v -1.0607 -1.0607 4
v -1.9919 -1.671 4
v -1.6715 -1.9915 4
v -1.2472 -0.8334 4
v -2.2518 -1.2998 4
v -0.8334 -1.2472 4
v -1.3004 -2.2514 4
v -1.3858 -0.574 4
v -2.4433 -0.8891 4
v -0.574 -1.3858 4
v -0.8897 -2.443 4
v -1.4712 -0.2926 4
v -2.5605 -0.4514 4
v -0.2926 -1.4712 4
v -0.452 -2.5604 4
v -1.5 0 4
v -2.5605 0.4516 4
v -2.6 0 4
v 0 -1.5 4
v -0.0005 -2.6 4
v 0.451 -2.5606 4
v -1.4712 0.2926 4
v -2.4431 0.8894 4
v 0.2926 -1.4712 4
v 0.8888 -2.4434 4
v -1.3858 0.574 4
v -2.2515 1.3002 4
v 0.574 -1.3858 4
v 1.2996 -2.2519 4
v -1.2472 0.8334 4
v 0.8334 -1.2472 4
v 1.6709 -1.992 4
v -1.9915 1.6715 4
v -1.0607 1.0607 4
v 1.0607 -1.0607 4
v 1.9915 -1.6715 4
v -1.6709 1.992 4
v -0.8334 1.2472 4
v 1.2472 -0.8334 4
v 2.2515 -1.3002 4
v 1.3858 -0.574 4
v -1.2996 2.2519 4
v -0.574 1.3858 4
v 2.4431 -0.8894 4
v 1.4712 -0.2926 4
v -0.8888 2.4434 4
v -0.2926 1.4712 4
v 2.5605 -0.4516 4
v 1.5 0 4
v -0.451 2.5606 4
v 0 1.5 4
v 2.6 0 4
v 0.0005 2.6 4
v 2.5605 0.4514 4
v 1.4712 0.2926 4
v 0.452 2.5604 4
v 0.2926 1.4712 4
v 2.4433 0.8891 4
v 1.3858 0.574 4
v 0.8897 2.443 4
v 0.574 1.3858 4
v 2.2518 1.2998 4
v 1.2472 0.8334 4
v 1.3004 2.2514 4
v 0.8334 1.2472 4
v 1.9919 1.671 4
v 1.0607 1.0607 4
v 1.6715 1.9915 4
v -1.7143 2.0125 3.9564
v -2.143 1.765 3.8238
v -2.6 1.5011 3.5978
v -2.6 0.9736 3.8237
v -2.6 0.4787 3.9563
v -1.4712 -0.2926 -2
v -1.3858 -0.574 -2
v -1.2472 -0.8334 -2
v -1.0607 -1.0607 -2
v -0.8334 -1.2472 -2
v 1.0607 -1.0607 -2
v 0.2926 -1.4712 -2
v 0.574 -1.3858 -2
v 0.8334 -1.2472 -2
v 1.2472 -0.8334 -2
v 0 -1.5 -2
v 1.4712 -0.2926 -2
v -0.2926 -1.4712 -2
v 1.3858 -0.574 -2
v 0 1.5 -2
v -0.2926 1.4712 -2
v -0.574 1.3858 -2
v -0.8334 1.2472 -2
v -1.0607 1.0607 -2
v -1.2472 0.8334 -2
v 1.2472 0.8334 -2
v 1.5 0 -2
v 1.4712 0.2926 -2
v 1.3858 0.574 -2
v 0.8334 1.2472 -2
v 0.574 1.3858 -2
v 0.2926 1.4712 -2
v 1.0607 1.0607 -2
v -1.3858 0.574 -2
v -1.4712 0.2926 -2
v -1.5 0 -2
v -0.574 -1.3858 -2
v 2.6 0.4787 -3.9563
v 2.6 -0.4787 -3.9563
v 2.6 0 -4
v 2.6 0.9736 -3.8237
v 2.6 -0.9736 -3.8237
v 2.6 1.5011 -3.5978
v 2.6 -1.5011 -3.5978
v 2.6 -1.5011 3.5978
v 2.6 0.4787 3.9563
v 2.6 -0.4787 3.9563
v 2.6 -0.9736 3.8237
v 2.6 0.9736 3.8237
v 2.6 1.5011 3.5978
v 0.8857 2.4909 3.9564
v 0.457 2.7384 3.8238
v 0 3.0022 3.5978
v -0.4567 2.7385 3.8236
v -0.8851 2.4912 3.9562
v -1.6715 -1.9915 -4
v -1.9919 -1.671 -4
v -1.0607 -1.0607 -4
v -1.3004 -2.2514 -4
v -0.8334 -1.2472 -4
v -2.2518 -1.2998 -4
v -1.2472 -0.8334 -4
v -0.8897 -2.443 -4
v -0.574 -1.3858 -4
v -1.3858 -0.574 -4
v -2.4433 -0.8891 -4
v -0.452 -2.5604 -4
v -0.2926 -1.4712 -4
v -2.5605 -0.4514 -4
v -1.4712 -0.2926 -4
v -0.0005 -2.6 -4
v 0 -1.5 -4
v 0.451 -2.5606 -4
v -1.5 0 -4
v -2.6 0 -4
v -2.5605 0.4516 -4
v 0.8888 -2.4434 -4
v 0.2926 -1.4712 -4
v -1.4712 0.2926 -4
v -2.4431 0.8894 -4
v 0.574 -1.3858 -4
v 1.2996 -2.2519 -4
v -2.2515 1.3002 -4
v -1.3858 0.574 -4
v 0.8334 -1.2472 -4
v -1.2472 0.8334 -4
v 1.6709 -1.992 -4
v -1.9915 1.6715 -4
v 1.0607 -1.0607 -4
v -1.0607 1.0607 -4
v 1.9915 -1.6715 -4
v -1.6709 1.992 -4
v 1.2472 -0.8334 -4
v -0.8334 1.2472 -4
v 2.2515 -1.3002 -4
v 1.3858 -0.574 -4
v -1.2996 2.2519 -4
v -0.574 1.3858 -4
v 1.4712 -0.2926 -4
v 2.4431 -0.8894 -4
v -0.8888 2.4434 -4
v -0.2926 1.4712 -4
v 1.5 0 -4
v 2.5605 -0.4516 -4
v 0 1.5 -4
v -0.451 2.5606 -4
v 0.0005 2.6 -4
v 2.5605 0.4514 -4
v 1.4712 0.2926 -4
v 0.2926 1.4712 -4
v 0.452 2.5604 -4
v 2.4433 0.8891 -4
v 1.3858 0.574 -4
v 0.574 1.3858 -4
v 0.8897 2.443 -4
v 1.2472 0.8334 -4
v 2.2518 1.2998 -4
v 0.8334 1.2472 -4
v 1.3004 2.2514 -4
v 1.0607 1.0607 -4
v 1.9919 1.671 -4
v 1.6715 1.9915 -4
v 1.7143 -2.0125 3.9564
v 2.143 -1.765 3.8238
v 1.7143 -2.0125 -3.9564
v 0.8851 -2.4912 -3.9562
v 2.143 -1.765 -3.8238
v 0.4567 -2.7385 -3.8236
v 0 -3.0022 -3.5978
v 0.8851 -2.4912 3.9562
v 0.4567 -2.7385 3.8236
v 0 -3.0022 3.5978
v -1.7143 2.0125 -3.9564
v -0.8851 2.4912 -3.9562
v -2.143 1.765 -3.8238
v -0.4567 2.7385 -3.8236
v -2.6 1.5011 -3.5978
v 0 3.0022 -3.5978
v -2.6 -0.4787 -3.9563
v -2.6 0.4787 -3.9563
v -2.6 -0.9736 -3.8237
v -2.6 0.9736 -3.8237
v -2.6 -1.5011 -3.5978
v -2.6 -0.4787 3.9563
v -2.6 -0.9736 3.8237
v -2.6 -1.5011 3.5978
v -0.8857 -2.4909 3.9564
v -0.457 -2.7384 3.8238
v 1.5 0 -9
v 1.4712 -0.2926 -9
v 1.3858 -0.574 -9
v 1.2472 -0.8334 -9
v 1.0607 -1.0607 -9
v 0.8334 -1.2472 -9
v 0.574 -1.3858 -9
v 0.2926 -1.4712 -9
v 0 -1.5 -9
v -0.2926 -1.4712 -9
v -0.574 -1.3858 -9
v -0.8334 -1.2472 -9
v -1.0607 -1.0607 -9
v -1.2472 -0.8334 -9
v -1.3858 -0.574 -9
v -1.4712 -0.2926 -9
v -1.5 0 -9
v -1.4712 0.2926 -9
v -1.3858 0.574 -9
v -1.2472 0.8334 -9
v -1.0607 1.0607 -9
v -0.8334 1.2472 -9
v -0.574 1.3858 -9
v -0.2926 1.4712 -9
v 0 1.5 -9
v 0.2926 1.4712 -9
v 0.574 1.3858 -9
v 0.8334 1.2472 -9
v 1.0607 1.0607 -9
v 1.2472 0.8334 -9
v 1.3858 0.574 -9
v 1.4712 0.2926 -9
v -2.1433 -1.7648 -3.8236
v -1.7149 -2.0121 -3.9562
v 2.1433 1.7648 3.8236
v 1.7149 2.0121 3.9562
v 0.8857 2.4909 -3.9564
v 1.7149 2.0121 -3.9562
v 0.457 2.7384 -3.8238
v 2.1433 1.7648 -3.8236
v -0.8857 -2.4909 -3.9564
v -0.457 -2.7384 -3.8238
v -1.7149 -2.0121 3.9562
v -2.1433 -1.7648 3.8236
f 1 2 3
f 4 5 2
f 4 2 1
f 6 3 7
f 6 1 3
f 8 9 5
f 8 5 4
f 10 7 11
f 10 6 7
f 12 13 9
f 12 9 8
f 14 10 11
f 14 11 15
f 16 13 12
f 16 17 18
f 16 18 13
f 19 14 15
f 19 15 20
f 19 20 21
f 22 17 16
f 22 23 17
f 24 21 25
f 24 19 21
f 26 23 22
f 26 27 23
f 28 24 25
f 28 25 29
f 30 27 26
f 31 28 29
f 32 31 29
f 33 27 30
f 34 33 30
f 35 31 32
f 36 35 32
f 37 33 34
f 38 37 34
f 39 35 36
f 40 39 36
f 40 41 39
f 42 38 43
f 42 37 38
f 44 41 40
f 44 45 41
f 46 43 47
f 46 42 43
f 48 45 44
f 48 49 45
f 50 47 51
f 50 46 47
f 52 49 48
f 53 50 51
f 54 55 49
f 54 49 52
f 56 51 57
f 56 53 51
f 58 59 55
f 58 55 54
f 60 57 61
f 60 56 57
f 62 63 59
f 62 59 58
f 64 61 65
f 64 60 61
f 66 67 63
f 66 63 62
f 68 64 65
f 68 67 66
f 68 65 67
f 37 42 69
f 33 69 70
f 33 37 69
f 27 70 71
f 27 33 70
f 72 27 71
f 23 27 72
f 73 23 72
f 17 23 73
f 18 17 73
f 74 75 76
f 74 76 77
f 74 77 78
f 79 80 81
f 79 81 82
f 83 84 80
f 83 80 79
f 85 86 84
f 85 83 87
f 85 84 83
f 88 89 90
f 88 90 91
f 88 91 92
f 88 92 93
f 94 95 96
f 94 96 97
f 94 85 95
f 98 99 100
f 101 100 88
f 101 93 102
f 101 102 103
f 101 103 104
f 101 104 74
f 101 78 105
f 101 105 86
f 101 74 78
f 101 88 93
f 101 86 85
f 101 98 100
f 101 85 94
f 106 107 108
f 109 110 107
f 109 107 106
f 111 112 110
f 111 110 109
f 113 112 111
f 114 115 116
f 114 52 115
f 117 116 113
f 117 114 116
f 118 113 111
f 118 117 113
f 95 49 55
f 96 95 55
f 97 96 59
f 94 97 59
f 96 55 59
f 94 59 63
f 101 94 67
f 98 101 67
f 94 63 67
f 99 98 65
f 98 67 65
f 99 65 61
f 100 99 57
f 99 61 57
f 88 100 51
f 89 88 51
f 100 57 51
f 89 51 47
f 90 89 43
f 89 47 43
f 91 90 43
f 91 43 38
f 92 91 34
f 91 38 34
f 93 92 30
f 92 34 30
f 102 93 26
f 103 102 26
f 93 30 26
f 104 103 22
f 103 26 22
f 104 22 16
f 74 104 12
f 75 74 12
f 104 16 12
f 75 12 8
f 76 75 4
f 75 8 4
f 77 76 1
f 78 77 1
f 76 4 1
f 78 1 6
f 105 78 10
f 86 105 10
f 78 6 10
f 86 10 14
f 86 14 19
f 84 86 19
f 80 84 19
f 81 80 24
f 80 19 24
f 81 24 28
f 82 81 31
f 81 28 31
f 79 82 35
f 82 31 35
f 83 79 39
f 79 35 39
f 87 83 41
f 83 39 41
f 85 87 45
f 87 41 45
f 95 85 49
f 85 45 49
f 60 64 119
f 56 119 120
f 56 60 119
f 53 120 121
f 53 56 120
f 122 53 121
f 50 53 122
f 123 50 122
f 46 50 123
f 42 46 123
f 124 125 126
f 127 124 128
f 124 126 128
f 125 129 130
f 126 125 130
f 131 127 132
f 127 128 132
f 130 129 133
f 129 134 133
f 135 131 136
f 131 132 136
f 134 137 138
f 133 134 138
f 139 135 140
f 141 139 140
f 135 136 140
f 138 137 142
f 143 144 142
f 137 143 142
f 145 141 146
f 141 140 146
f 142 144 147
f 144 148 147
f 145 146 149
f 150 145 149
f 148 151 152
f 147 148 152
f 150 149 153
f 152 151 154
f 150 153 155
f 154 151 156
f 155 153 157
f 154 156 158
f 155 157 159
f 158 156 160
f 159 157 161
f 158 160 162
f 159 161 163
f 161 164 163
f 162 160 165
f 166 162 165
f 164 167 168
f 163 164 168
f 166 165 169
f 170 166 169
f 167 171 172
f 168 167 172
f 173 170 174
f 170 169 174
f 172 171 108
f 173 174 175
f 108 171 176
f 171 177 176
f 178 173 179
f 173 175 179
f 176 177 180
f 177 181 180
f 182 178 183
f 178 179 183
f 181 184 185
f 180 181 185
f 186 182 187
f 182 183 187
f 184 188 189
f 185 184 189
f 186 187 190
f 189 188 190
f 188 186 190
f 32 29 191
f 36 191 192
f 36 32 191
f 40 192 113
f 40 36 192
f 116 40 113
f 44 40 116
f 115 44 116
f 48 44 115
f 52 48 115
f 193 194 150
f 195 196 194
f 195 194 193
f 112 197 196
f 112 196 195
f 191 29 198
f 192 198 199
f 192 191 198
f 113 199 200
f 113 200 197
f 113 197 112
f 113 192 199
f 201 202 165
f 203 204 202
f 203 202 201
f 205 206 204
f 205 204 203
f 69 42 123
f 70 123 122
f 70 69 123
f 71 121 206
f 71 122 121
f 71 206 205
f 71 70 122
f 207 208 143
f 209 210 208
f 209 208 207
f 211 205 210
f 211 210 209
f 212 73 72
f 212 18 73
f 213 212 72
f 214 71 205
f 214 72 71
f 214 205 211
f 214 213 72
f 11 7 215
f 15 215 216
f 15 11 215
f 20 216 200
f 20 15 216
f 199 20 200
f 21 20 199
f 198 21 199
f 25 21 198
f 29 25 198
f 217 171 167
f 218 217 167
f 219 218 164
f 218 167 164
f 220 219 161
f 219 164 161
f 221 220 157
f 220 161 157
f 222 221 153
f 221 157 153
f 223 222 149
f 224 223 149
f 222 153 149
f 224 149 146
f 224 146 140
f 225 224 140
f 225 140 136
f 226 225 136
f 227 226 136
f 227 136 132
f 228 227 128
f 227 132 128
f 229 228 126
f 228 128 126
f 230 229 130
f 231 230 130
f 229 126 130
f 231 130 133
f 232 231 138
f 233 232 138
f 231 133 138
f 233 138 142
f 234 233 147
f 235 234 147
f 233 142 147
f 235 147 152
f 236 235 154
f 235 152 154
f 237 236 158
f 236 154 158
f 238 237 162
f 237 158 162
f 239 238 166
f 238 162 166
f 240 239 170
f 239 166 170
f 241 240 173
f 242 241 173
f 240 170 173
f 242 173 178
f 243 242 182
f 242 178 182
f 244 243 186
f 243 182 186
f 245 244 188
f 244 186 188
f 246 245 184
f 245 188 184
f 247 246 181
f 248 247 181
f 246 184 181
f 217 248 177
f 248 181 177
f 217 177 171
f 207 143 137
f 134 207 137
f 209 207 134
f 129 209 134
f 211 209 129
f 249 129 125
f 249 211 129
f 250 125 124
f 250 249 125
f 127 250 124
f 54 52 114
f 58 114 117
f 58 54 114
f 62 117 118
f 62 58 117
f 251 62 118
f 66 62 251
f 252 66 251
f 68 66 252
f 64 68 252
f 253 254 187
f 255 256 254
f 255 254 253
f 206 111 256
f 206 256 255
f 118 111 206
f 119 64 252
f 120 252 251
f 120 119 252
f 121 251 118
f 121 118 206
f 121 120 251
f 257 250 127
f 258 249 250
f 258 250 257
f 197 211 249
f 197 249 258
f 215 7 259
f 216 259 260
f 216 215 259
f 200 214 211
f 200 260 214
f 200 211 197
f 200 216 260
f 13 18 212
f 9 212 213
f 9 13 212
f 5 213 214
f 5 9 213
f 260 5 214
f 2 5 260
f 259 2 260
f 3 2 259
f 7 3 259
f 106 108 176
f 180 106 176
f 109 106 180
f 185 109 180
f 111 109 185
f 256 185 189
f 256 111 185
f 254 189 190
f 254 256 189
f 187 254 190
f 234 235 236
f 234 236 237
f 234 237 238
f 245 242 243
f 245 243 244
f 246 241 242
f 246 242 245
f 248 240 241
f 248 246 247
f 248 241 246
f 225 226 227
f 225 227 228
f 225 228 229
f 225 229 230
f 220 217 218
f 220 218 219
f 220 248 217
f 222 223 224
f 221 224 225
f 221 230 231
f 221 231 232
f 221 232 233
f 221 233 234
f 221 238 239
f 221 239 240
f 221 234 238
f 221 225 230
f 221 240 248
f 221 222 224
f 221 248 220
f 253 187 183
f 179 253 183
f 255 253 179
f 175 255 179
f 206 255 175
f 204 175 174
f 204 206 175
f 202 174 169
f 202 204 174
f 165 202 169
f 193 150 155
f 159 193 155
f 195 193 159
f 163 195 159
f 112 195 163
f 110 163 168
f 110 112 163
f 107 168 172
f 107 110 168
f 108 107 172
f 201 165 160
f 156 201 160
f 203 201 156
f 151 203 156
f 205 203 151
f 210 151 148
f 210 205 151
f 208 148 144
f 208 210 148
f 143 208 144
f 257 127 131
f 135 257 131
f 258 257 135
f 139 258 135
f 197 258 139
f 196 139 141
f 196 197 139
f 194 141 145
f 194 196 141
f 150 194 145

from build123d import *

# Parameters (mm, degrees)
PAD_DEPTH    = 4
SKETCH001_R  = 1.5
POCKET_DEPTH = 6
SKETCH004_R  = 1.5
PAD001_DEPTH = 5


with BuildPart() as body001:
    # Sketch003 → Revolution (revolve)
    with BuildSketch(Plane.YZ):
        Polygon((1.6, 5), (4.6, 5), (4.6, -5), (1.6, -5), (4.1, -2.5), (4.1, 2.5), align=None)
    revolve(axis=Axis((0, 0, 0), (0, 0, 1)))


with BuildPart() as cut:
    # Sketch → Pad (new body, symmetric)
    with BuildSketch(Plane.XY):
        Polygon((2.6, 1.501111), (0, 3.002221), (-2.6, 1.501111), (-2.6, -1.501111), (0, -3.002221), (2.6, -1.501111), align=None)
    extrude(amount=PAD_DEPTH, both=True)

    # Sketch001 (on Face8 of Pad) → Pocket (cut)
    with BuildSketch(Plane.XY.offset(4)):
        Circle(SKETCH001_R)
    extrude(amount=-POCKET_DEPTH, mode=Mode.SUBTRACT)

    # Sketch004 (on Face4 of Pocket) → Pad001 (join)
    with BuildSketch(Plane(origin=(0, 0, -4), x_dir=(1, 0, 0), z_dir=(0, 0, -1))):
        Circle(SKETCH004_R)
    extrude(amount=PAD001_DEPTH)

    # Cut: cut Body001
    add(body001.part, mode=Mode.SUBTRACT)


solid = cut.part
